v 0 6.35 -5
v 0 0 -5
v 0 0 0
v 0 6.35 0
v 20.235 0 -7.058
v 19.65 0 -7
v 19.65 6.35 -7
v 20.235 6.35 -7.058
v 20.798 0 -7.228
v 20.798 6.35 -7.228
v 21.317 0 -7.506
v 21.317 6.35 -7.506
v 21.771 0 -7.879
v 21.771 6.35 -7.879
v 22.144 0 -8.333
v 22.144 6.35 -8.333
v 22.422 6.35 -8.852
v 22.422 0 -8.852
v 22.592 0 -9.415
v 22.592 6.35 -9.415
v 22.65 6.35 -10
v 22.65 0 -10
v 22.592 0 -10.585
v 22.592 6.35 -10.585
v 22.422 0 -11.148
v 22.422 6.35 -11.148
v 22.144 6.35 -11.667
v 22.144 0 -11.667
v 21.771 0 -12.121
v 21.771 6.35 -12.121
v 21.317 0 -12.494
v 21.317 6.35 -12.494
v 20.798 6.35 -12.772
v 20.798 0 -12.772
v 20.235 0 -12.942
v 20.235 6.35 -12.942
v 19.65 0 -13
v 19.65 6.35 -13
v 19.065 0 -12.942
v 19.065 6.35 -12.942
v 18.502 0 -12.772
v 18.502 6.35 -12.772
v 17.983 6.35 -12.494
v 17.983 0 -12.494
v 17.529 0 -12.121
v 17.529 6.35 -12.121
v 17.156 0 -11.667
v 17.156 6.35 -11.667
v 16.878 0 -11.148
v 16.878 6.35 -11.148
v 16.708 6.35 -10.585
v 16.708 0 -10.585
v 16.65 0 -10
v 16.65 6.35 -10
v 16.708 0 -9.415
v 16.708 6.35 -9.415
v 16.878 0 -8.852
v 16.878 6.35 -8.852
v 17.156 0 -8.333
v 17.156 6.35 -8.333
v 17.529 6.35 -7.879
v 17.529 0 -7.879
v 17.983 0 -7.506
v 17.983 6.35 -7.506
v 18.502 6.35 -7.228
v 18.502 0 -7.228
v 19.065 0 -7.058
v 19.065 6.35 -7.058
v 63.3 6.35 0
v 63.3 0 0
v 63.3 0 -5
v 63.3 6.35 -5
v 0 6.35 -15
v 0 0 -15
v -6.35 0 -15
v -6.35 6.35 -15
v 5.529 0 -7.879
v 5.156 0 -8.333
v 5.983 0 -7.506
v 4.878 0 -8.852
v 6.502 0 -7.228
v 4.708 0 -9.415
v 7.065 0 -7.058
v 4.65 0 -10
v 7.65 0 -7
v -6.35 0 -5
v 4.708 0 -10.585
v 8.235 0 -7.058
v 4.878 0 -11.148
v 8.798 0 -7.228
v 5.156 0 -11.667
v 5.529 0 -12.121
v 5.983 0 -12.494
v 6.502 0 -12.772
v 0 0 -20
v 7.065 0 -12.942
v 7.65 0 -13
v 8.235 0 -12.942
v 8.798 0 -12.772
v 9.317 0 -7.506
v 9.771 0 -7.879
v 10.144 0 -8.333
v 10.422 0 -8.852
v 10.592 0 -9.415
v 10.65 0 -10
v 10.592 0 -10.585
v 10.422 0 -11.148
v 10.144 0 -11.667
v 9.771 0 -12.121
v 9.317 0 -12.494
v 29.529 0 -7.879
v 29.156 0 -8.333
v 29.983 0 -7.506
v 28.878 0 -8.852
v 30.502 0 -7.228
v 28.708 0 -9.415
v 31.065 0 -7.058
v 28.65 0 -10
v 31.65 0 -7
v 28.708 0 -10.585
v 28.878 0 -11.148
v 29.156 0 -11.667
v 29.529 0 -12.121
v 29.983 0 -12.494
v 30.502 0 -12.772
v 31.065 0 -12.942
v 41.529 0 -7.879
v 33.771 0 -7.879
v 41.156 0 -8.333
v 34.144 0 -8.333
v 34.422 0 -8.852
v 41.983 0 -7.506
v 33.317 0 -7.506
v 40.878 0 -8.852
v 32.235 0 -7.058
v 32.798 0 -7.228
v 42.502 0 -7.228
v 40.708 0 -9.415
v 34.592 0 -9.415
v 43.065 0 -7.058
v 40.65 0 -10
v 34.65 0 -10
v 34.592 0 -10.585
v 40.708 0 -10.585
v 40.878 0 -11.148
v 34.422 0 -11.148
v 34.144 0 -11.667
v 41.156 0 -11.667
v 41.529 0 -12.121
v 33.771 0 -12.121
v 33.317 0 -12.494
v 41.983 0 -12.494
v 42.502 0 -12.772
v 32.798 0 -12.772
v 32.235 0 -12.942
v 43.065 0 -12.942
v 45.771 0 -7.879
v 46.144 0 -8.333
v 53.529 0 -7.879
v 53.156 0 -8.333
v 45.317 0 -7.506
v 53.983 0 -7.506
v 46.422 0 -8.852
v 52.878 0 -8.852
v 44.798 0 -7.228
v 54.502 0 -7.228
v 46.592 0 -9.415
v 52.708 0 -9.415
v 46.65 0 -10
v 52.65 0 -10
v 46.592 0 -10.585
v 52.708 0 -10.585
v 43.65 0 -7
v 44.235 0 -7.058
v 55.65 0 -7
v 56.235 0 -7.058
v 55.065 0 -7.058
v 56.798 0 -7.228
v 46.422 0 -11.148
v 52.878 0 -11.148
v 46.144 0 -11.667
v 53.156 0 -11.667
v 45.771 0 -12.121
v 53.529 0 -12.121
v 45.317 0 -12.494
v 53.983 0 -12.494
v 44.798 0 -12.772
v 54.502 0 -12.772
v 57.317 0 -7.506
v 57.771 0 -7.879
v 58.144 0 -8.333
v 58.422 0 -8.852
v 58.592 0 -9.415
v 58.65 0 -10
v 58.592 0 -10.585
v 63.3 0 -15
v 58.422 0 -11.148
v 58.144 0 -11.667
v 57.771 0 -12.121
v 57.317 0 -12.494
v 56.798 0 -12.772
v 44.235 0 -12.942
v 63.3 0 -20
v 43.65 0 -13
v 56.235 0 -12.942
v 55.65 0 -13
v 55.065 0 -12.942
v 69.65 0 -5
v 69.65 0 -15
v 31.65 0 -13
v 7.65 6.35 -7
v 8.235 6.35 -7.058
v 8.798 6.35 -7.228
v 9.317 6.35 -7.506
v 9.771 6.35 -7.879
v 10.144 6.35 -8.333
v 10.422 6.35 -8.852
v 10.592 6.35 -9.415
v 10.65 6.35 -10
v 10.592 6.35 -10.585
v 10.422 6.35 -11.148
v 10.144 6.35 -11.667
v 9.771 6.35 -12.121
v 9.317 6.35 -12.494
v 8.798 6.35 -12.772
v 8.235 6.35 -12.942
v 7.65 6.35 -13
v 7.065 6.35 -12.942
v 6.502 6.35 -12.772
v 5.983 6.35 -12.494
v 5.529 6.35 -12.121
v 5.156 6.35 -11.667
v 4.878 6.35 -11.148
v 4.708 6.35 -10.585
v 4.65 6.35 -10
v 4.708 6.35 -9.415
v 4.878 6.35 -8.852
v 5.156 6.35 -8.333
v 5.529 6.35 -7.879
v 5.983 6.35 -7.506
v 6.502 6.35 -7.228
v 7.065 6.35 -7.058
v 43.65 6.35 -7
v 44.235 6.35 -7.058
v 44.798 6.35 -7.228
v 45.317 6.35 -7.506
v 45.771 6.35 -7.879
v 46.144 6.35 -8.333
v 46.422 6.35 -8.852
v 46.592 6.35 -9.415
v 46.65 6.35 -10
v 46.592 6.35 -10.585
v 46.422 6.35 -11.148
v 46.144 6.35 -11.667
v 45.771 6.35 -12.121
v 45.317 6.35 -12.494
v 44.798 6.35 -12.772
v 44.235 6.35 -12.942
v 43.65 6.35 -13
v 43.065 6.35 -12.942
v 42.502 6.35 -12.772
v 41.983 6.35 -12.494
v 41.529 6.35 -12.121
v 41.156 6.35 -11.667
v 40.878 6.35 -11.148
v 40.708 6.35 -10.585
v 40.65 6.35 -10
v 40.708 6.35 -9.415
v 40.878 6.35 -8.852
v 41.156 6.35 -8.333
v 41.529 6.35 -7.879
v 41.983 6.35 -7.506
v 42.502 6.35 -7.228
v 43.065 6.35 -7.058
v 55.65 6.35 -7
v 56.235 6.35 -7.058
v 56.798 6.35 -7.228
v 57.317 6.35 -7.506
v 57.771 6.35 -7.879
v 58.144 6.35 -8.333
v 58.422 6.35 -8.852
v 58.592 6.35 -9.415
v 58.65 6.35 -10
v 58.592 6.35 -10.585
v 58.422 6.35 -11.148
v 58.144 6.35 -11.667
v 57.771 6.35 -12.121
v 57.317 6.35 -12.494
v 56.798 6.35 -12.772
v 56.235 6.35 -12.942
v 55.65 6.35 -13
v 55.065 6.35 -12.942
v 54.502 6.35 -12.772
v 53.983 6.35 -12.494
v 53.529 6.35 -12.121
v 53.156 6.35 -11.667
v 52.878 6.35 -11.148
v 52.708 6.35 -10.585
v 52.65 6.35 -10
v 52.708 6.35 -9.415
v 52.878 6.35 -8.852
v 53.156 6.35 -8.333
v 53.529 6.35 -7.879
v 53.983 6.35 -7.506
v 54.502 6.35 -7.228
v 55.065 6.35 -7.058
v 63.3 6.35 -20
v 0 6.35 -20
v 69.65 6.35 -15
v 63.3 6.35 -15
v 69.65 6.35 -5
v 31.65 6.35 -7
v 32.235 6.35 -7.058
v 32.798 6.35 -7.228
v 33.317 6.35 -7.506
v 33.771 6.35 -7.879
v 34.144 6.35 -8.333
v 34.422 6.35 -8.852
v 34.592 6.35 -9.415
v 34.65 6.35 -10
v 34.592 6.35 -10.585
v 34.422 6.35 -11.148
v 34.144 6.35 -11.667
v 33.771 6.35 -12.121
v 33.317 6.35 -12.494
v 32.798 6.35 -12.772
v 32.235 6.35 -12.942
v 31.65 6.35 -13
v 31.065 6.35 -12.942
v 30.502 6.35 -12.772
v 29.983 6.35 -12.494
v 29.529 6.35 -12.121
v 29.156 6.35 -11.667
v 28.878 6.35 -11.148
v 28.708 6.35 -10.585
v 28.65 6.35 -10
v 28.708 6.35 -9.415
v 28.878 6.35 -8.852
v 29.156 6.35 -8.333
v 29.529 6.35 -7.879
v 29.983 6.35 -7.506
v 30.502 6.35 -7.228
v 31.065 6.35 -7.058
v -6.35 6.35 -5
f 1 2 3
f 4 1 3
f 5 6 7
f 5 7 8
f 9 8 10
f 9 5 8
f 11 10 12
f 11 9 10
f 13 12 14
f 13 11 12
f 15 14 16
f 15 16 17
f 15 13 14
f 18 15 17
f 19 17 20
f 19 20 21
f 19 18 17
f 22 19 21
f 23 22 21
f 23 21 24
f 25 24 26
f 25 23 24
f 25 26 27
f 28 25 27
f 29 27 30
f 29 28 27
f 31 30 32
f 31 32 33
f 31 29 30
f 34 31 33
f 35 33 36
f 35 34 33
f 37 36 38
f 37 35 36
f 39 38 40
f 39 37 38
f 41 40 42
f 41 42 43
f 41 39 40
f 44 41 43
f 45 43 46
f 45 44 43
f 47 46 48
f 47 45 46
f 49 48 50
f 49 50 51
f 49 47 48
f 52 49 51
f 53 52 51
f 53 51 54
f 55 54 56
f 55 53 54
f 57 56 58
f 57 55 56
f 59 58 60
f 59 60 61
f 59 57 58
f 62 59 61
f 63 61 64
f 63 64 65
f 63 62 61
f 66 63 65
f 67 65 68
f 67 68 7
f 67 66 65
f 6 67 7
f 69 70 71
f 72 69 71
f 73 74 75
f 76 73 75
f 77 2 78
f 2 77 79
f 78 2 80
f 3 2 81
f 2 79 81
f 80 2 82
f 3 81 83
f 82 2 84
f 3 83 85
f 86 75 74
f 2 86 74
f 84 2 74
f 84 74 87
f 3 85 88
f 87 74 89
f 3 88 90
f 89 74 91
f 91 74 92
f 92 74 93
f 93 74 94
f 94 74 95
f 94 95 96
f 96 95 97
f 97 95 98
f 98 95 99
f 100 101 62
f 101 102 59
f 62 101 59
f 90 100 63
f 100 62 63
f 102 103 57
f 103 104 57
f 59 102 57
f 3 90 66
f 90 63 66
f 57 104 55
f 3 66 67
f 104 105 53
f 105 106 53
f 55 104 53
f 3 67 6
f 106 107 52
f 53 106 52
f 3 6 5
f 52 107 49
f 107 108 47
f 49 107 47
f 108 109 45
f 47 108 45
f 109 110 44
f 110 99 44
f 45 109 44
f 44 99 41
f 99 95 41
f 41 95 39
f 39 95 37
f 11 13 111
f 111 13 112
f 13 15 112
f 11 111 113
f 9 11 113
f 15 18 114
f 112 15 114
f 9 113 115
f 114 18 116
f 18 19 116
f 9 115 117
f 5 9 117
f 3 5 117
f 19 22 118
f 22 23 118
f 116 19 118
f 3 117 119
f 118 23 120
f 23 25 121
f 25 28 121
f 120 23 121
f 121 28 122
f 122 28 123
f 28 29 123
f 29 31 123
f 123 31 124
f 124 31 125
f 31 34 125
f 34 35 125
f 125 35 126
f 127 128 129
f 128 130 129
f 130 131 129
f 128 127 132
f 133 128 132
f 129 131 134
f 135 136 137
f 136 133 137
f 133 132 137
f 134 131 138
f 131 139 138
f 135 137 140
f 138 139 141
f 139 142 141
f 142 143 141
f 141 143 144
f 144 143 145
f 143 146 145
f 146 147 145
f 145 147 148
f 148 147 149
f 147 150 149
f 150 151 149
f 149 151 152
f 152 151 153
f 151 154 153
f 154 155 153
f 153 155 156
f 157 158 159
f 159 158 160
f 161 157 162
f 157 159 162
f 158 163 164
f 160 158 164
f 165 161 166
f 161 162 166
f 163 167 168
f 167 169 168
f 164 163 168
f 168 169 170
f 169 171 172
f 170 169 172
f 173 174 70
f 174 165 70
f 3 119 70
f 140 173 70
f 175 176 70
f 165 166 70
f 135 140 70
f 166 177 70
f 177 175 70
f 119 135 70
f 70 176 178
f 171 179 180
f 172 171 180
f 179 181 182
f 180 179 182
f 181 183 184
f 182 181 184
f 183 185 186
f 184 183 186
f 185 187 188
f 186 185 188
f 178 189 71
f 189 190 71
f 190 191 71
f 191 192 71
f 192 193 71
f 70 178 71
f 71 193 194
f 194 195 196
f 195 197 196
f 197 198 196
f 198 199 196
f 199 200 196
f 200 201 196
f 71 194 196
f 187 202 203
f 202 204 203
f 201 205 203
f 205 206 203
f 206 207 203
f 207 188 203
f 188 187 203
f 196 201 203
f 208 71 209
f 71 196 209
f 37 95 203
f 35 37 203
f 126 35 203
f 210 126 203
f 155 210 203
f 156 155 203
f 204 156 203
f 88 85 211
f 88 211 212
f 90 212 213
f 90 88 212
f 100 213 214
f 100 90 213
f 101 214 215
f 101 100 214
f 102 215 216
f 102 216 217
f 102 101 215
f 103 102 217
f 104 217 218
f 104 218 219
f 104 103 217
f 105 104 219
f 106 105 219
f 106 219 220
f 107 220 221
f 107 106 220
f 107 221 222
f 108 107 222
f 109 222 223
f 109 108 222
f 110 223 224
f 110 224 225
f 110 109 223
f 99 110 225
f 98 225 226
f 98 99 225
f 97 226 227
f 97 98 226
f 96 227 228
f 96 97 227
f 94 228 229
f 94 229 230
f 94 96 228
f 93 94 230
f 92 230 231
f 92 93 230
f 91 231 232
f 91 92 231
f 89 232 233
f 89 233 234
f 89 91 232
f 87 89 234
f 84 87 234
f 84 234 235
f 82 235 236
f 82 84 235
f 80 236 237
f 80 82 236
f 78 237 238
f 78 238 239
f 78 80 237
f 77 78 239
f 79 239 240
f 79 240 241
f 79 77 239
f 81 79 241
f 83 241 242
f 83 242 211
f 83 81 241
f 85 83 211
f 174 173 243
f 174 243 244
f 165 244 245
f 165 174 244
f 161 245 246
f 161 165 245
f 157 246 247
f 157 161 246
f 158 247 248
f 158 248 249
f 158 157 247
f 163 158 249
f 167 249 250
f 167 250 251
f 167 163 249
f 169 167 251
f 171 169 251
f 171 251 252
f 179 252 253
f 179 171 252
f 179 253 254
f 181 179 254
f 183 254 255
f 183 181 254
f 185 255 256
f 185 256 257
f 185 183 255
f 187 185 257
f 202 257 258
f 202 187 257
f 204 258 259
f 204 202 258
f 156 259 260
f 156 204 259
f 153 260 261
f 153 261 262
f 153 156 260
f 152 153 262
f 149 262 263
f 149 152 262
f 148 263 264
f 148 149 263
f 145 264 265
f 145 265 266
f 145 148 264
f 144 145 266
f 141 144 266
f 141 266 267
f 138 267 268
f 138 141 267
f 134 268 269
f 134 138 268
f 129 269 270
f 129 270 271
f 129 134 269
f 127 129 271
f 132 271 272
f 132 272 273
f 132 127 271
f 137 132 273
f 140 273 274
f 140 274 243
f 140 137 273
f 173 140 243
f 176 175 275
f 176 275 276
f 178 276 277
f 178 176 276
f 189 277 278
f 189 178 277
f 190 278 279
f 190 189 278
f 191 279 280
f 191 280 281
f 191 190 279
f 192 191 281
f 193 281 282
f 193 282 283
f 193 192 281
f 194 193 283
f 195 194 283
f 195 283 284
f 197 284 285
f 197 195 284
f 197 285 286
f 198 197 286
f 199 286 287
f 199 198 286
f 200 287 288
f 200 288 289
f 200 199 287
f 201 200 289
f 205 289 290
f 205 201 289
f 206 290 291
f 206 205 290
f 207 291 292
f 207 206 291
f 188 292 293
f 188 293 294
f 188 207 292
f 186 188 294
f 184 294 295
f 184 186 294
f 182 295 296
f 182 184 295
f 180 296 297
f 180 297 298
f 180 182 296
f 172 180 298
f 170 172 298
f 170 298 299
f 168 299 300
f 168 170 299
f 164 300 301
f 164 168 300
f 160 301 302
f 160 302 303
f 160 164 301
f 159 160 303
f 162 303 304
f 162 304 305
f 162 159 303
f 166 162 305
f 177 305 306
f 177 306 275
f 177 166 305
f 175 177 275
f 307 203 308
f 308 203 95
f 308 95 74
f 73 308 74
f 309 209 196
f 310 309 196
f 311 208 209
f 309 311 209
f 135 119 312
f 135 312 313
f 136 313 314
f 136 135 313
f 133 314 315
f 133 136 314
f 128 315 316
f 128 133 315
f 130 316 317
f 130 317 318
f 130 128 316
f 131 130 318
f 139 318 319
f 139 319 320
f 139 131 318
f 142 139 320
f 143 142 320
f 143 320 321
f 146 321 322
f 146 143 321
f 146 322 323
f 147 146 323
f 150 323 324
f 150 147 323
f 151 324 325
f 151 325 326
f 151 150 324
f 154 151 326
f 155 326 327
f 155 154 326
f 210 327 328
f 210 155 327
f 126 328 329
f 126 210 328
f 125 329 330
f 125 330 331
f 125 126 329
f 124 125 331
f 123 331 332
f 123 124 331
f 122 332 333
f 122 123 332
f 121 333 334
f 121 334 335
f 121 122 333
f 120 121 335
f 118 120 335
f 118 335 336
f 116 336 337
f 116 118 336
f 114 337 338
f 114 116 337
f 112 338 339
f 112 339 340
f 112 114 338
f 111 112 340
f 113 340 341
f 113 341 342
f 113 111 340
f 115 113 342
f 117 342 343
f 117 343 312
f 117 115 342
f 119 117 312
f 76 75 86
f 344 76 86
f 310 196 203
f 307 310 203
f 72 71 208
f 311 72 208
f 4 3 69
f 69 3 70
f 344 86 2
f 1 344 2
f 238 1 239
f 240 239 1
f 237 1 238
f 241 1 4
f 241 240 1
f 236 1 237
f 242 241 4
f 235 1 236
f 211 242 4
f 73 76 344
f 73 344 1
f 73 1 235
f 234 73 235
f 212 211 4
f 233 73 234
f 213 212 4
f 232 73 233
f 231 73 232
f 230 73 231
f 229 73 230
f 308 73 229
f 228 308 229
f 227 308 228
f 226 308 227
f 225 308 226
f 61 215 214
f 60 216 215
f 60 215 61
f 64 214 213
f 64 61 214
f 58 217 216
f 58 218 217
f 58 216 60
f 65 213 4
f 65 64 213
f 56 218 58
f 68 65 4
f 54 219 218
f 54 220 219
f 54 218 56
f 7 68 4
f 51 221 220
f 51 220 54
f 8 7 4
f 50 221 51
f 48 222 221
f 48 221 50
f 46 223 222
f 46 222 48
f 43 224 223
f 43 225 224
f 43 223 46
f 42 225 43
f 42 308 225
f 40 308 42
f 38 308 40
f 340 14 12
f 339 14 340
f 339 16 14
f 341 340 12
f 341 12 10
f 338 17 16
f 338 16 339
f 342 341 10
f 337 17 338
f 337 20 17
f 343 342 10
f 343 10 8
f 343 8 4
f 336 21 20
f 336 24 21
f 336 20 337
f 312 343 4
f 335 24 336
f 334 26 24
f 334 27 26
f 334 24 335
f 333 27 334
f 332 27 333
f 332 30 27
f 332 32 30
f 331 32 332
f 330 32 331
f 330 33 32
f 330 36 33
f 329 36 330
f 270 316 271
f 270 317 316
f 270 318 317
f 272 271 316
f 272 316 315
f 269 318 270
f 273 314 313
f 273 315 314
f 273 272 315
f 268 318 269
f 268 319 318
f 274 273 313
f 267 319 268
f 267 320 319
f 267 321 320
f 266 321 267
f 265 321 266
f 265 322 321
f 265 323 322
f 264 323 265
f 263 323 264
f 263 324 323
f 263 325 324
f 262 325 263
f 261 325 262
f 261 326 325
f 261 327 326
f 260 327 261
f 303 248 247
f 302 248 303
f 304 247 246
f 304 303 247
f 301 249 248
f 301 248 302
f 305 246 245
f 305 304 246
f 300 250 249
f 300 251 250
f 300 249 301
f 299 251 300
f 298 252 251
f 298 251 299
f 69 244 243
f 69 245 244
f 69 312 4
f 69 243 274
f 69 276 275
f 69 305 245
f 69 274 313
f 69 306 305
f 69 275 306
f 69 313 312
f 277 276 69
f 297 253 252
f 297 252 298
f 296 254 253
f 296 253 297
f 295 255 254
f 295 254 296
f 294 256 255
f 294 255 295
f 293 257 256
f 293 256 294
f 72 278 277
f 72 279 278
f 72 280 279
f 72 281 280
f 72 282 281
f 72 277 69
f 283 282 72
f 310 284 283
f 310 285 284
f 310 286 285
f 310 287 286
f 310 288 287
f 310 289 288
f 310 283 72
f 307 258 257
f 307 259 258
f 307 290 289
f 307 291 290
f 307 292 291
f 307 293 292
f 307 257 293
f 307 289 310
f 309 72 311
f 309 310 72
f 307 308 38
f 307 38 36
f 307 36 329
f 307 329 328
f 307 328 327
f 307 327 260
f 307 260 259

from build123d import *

# Parameters (mm, degrees)
SKETCH1_R           = 3
BOSS_EXTRUDE1_DEPTH = 6.35


with BuildPart() as part:
    # Sketch1 → Boss-Extrude1 (new body)
    with BuildSketch(Plane(origin=(0, 0, 0), x_dir=(1, 0, 0), z_dir=(0, 1, 0))):
        Polygon((0, 0), (63.3, 0), (63.3, 5), (69.65, 5), (69.65, 15), (63.3, 15), (63.3, 20), (0, 20), (0, 15), (-6.35, 15), (-6.35, 5), (0, 5), align=None)
        with Locations(Location((7.65, 10, 0), (0, 0, 270))):
            Circle(SKETCH1_R, mode=Mode.SUBTRACT)
        with Locations(Location((19.65, 10, 0), (0, 0, 270))):
            Circle(SKETCH1_R, mode=Mode.SUBTRACT)
        with Locations(Location((31.65, 10, 0), (0, 0, 270))):
            Circle(SKETCH1_R, mode=Mode.SUBTRACT)
        with Locations(Location((43.65, 10, 0), (0, 0, 270))):
            Circle(SKETCH1_R, mode=Mode.SUBTRACT)
        with Locations(Location((55.65, 10, 0), (0, 0, 270))):
            Circle(SKETCH1_R, mode=Mode.SUBTRACT)
    extrude(amount=BOSS_EXTRUDE1_DEPTH)


solid = part.part
